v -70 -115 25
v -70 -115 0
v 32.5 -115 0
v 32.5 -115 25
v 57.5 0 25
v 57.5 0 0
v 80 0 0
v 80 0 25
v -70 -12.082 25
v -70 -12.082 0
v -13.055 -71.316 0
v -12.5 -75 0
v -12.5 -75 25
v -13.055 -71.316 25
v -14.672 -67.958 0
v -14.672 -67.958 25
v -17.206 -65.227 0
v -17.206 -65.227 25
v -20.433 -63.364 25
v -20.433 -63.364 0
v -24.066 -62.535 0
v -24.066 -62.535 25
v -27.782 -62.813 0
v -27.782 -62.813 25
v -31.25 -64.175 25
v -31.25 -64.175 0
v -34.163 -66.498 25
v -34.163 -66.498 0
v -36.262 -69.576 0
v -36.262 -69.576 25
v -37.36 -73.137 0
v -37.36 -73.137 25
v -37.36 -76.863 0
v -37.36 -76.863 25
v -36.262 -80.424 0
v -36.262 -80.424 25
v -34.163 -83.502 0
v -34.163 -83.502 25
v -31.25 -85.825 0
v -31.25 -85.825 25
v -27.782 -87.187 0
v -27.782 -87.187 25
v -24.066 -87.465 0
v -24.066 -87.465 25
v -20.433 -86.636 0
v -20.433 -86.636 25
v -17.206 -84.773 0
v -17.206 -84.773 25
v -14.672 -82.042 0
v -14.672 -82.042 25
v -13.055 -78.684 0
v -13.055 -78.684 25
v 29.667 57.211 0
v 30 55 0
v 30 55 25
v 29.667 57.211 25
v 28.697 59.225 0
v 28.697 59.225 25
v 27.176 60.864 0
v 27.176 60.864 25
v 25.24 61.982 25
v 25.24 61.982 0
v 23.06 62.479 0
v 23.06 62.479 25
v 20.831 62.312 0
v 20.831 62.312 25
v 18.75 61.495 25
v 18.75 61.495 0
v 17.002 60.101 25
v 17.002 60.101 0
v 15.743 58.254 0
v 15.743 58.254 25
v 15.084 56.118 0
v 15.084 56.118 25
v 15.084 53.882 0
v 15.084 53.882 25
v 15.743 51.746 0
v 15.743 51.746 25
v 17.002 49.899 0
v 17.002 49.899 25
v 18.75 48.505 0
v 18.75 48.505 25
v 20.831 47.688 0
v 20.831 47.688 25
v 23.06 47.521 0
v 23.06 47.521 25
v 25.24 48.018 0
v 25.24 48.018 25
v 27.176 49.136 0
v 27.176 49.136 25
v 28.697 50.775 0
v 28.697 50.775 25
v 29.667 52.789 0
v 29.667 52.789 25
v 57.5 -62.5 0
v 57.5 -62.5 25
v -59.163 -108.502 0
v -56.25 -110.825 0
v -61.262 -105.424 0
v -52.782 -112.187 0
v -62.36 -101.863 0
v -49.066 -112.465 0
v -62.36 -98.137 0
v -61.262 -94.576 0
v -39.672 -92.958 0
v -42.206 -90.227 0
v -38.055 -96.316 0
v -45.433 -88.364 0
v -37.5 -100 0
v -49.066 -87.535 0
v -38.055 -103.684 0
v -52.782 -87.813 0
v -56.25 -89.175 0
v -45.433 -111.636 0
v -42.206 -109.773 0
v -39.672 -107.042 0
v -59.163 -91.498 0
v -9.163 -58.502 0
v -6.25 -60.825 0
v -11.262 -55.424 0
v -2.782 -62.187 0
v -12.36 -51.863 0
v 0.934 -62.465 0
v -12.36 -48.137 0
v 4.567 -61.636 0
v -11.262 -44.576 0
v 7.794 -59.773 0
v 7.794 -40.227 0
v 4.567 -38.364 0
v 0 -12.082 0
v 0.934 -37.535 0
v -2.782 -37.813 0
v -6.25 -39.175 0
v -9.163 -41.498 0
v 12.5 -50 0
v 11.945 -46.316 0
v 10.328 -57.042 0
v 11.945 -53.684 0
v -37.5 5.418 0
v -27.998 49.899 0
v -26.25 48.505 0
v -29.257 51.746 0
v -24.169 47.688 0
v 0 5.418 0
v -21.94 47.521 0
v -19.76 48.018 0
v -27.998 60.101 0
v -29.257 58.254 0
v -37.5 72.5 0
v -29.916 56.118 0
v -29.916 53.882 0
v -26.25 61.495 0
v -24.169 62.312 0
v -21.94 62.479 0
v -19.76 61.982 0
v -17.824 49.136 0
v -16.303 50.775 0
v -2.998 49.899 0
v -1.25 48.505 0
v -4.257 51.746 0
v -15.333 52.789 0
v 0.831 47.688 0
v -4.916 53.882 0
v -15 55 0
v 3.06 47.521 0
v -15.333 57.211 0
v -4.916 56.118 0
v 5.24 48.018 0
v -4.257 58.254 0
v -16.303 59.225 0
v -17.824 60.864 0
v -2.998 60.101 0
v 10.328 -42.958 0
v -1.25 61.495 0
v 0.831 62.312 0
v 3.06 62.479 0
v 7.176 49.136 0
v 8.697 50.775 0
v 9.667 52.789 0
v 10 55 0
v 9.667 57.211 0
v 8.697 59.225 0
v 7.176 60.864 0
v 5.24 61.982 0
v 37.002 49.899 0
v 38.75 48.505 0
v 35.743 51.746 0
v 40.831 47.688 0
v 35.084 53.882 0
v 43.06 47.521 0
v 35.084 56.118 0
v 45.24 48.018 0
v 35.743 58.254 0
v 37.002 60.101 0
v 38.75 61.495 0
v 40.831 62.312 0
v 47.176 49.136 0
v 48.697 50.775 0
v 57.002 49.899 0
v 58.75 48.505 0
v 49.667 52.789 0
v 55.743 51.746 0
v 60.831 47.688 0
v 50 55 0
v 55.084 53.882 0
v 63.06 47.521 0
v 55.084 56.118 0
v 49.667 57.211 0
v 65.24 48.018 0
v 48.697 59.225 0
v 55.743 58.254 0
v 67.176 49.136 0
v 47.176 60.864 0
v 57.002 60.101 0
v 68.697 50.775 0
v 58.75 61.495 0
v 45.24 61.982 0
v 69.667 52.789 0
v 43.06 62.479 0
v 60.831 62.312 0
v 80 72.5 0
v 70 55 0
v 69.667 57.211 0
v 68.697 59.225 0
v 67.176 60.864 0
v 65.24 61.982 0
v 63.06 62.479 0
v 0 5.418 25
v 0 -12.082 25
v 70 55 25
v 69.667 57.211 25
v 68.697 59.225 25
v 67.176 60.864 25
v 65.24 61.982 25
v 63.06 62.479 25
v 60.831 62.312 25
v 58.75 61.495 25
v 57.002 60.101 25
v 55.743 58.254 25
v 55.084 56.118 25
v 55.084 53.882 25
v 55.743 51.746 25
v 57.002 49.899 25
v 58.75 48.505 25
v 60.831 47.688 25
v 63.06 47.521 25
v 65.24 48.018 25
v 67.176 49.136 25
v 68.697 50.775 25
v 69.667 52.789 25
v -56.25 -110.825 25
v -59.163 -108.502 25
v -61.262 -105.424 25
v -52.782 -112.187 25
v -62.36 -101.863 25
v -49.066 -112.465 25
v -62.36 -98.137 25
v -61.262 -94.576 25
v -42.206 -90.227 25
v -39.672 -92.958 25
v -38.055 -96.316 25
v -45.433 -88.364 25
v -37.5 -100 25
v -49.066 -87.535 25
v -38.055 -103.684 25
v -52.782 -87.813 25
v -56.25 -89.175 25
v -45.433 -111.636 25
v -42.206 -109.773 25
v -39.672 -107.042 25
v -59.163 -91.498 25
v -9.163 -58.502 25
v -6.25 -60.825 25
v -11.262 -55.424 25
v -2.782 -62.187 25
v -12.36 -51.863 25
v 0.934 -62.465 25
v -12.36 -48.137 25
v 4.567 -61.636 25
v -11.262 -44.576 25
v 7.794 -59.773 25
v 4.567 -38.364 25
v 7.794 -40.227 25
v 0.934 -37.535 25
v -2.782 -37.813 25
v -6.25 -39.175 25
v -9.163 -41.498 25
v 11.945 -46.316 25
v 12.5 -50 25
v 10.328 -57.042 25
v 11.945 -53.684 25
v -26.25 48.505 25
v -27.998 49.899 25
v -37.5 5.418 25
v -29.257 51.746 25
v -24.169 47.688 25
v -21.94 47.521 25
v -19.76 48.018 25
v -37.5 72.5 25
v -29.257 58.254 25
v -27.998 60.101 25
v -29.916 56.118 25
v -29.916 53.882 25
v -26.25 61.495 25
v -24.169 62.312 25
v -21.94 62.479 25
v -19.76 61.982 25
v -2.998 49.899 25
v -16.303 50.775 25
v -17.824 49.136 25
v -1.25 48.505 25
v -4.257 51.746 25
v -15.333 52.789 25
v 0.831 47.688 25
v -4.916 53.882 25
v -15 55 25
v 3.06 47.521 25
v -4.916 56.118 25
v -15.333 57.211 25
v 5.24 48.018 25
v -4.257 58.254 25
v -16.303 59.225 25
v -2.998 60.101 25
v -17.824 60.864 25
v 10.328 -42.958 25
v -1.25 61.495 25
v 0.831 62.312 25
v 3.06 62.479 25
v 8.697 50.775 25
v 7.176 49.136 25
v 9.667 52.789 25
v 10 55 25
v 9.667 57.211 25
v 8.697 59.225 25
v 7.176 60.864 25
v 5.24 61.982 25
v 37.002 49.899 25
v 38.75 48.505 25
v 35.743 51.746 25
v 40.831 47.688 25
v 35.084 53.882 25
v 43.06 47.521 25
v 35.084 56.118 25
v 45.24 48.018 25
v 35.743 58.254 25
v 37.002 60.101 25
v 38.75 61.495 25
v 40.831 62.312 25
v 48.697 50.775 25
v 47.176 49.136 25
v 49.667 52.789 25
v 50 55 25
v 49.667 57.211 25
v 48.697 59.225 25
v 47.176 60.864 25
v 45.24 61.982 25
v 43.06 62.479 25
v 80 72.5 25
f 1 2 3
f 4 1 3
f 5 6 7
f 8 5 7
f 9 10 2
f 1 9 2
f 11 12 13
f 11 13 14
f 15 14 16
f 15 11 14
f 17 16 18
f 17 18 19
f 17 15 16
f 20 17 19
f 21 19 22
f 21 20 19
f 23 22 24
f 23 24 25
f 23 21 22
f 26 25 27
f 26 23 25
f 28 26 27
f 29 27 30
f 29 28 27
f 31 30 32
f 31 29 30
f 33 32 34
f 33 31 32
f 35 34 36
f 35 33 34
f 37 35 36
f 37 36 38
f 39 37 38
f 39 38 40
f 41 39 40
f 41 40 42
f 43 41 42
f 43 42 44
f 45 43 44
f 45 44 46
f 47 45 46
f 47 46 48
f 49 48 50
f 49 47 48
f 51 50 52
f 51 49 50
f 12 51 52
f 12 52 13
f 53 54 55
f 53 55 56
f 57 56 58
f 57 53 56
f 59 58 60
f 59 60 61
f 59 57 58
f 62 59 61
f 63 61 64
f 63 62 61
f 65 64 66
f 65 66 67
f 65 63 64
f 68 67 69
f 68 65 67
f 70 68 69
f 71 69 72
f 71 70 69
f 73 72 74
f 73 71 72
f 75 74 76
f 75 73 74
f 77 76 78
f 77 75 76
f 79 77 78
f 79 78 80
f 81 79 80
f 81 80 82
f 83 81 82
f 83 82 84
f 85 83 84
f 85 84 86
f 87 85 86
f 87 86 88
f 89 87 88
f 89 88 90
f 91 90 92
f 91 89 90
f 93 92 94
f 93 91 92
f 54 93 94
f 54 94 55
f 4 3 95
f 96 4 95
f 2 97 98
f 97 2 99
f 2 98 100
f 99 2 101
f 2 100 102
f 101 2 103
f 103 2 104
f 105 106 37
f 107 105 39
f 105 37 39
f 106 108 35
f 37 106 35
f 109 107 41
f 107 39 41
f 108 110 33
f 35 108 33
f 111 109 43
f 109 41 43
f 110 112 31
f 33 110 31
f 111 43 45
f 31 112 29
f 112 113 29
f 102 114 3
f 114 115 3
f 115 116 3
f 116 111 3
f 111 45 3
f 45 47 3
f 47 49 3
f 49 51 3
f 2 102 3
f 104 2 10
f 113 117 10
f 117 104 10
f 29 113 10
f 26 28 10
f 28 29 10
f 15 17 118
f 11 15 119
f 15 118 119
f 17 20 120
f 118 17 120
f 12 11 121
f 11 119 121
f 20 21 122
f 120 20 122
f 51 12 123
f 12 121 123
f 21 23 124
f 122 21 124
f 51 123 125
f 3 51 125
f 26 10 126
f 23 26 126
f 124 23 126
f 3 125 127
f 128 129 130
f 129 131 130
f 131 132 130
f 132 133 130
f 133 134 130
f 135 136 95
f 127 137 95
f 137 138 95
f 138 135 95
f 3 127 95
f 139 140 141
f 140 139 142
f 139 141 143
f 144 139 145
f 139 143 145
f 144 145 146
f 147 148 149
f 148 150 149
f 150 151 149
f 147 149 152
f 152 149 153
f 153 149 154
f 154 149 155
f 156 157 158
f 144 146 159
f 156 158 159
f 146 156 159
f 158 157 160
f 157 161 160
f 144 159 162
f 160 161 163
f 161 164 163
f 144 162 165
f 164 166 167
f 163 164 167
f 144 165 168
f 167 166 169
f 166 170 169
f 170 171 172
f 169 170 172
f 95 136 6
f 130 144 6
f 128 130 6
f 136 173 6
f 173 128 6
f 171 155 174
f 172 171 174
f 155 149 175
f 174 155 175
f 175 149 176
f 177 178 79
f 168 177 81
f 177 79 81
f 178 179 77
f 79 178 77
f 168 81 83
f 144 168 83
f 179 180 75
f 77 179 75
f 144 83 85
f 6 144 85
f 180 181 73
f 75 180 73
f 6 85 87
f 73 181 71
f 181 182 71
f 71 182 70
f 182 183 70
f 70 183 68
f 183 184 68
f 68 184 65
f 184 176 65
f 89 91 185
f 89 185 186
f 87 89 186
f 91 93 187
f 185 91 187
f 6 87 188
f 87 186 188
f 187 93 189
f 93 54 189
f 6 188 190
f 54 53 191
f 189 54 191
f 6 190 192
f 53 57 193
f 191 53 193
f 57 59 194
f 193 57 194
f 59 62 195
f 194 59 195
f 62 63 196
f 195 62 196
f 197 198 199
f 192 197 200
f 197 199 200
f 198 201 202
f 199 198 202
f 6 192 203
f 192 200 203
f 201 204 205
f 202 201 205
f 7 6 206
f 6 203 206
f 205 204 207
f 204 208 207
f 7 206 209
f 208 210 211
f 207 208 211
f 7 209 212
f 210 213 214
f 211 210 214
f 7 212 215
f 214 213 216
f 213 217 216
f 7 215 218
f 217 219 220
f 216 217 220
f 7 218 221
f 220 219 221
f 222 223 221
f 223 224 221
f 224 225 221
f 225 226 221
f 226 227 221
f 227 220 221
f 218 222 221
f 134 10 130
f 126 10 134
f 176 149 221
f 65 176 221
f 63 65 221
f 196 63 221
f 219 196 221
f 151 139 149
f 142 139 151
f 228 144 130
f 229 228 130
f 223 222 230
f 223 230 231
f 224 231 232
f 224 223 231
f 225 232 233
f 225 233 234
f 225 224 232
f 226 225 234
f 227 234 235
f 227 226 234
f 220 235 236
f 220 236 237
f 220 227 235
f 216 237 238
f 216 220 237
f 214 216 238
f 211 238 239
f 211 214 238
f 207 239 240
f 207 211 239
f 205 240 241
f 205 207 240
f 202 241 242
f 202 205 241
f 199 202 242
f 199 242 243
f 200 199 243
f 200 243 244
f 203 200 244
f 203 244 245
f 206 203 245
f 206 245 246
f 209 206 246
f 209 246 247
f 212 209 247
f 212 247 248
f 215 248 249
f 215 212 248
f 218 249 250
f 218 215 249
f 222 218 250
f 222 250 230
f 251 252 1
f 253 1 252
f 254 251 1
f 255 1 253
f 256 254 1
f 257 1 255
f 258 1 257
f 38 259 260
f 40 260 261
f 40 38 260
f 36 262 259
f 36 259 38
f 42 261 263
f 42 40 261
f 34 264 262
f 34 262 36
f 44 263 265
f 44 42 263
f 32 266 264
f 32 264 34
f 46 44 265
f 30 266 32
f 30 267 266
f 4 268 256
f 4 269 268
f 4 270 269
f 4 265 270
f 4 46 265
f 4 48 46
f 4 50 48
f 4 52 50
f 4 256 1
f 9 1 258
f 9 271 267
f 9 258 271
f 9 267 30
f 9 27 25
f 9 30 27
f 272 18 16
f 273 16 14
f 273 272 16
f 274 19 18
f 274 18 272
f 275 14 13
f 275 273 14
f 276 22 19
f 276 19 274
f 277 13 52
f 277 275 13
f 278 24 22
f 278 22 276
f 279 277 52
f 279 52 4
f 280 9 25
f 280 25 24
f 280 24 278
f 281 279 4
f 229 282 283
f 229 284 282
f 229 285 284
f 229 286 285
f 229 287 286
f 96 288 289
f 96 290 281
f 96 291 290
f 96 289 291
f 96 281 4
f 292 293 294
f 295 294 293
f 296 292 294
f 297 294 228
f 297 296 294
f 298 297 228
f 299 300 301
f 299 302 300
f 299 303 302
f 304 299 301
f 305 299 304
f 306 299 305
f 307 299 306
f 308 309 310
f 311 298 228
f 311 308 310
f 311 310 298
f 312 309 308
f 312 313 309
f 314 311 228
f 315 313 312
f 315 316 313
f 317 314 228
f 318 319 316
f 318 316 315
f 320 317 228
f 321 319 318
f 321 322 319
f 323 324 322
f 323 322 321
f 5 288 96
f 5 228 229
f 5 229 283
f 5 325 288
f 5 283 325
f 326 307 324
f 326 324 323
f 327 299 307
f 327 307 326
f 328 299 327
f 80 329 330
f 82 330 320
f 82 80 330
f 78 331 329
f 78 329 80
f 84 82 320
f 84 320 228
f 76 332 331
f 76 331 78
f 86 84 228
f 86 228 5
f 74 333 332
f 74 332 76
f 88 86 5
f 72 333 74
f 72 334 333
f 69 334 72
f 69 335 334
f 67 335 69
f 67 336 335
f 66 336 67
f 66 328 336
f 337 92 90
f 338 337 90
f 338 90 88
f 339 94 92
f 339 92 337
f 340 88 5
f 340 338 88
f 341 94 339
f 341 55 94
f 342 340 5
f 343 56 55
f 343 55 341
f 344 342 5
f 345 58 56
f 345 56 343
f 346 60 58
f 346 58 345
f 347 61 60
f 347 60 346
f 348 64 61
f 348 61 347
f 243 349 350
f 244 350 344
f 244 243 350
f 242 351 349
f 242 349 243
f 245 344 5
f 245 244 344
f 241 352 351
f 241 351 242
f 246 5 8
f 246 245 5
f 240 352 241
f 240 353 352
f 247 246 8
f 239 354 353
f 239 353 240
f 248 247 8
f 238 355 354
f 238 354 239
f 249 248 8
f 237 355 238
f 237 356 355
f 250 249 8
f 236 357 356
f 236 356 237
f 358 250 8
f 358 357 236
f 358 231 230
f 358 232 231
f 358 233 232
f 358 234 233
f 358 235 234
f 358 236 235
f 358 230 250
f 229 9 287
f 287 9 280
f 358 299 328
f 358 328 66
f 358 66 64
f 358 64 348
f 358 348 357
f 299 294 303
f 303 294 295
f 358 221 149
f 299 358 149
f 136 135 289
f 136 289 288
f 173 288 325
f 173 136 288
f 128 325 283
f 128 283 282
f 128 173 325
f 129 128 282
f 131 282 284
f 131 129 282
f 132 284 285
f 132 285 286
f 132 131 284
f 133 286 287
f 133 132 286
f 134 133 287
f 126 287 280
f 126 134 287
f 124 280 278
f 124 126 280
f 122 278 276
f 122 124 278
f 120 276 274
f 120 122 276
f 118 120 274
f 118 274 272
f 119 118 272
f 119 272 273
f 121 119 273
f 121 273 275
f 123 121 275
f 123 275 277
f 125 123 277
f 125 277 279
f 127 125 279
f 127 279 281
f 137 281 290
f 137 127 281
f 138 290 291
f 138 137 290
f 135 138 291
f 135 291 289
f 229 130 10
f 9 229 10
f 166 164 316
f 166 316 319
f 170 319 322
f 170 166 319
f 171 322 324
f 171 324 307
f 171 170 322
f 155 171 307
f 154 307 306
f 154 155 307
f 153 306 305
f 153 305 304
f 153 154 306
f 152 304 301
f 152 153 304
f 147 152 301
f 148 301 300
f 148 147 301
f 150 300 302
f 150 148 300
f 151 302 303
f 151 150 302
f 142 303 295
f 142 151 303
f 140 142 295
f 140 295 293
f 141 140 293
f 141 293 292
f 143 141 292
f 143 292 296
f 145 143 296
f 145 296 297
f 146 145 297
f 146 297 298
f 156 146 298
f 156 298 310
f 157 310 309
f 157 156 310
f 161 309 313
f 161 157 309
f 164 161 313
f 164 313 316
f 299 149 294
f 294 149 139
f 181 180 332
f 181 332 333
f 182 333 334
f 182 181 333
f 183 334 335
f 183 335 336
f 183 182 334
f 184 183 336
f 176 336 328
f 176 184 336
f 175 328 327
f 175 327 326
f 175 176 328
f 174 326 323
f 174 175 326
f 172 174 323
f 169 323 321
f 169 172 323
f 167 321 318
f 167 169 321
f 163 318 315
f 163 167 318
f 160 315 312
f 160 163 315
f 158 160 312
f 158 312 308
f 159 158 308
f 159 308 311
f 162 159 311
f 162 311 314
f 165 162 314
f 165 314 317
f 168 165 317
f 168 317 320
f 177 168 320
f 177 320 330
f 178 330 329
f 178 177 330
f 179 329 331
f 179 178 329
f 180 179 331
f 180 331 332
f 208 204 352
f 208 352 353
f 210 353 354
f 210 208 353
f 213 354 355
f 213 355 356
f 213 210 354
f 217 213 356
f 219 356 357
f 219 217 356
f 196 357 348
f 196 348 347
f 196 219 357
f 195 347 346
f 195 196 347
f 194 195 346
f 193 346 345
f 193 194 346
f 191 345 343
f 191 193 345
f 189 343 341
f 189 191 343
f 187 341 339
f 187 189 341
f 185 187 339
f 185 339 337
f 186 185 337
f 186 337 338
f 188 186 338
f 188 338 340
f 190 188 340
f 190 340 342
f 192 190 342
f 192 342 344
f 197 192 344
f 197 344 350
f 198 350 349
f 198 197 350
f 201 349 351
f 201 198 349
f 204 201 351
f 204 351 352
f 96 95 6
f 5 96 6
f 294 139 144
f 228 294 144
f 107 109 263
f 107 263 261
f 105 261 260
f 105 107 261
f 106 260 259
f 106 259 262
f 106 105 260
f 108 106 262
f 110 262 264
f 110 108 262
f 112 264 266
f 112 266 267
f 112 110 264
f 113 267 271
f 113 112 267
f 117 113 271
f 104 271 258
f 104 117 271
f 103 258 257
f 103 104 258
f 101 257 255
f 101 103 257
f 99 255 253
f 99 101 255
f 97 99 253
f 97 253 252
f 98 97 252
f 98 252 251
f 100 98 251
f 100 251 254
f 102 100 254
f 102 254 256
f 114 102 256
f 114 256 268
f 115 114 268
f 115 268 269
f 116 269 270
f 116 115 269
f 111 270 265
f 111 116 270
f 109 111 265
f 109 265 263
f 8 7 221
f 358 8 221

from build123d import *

# Parameters (mm, degrees)
F0_R     = 12.5
F0_R_2   = 7.5
F1_DEPTH = 25


with BuildPart() as f1:
    # F0 (on Top) → F1 (new body)
    with BuildSketch(Plane.XY):
        Polygon((0, -12.08159), (-70, -12.08159), (-70, -115), (32.5, -115), (57.5, -62.5), (57.5, 0), (80, 0), (80, 72.5), (-37.5, 72.5), (-37.5, 5.41841), (0, 5.41841), align=None)
        with Locations((-50, -100)):
            Circle(F0_R, mode=Mode.SUBTRACT)
        with Locations((-25, -75)):
            Circle(F0_R, mode=Mode.SUBTRACT)
        with Locations((0, -50)):
            Circle(F0_R, mode=Mode.SUBTRACT)
        with Locations((-22.5, 55)):
            Circle(F0_R_2, mode=Mode.SUBTRACT)
        with Locations((2.5, 55)):
            Circle(F0_R_2, mode=Mode.SUBTRACT)
        with Locations((22.5, 55)):
            Circle(F0_R_2, mode=Mode.SUBTRACT)
        with Locations((42.5, 55)):
            Circle(F0_R_2, mode=Mode.SUBTRACT)
        with Locations((62.5, 55)):
            Circle(F0_R_2, mode=Mode.SUBTRACT)
    extrude(amount=F1_DEPTH)


solid = f1.part
